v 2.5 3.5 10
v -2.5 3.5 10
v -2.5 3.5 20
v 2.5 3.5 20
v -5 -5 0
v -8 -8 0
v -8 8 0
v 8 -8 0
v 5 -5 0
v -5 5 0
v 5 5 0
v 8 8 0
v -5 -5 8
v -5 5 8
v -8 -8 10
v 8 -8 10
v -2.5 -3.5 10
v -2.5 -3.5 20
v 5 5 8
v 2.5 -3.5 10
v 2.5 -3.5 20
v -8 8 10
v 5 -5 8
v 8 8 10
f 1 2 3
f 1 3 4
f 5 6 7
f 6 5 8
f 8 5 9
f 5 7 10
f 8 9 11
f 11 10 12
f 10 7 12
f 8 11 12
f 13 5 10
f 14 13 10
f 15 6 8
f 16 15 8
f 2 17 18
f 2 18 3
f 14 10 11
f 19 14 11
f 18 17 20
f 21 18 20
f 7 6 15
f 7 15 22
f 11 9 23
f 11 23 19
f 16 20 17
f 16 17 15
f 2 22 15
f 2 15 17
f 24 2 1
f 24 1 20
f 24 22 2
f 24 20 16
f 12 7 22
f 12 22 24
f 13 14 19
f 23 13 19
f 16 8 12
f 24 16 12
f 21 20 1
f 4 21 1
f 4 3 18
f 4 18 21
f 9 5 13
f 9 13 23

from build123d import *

# Parameters (mm, degrees)
BOX002_W     = 10
BOX002_H     = 10
BOX002_DEPTH = 8
BOX001_W     = 5
BOX001_H     = 7
BOX001_DEPTH = 10
BOX_W        = 16
BOX_H        = 16
BOX_DEPTH    = 10


with BuildPart() as cube002:
    # Box002 → Box002 (new body)
    with BuildSketch(Plane(origin=(-5, -5, 0), x_dir=(1, 0, 0), z_dir=(0, 0, 1))):
        with Locations((5, 5)):
            Rectangle(BOX002_W, BOX002_H)
    extrude(amount=BOX002_DEPTH)


with BuildPart() as cube001:
    # Box001 → Box001 (new body)
    with BuildSketch(Plane(origin=(-2.5, -3.5, 10), x_dir=(1, 0, 0), z_dir=(0, 0, 1))):
        with Locations((2.5, 3.5)):
            Rectangle(BOX001_W, BOX001_H)
    extrude(amount=BOX001_DEPTH)


with BuildPart() as cut:
    # Box → Box (new body)
    with BuildSketch(Plane(origin=(-8, -8, 0), x_dir=(1, 0, 0), z_dir=(0, 0, 1))):
        with Locations((8, 8)):
            Rectangle(BOX_W, BOX_H)
    extrude(amount=BOX_DEPTH)

    # Fusion: union Cube001
    add(cube001.part)

    # Cut: cut Cube002
    add(cube002.part, mode=Mode.SUBTRACT)


solid = cut.part
